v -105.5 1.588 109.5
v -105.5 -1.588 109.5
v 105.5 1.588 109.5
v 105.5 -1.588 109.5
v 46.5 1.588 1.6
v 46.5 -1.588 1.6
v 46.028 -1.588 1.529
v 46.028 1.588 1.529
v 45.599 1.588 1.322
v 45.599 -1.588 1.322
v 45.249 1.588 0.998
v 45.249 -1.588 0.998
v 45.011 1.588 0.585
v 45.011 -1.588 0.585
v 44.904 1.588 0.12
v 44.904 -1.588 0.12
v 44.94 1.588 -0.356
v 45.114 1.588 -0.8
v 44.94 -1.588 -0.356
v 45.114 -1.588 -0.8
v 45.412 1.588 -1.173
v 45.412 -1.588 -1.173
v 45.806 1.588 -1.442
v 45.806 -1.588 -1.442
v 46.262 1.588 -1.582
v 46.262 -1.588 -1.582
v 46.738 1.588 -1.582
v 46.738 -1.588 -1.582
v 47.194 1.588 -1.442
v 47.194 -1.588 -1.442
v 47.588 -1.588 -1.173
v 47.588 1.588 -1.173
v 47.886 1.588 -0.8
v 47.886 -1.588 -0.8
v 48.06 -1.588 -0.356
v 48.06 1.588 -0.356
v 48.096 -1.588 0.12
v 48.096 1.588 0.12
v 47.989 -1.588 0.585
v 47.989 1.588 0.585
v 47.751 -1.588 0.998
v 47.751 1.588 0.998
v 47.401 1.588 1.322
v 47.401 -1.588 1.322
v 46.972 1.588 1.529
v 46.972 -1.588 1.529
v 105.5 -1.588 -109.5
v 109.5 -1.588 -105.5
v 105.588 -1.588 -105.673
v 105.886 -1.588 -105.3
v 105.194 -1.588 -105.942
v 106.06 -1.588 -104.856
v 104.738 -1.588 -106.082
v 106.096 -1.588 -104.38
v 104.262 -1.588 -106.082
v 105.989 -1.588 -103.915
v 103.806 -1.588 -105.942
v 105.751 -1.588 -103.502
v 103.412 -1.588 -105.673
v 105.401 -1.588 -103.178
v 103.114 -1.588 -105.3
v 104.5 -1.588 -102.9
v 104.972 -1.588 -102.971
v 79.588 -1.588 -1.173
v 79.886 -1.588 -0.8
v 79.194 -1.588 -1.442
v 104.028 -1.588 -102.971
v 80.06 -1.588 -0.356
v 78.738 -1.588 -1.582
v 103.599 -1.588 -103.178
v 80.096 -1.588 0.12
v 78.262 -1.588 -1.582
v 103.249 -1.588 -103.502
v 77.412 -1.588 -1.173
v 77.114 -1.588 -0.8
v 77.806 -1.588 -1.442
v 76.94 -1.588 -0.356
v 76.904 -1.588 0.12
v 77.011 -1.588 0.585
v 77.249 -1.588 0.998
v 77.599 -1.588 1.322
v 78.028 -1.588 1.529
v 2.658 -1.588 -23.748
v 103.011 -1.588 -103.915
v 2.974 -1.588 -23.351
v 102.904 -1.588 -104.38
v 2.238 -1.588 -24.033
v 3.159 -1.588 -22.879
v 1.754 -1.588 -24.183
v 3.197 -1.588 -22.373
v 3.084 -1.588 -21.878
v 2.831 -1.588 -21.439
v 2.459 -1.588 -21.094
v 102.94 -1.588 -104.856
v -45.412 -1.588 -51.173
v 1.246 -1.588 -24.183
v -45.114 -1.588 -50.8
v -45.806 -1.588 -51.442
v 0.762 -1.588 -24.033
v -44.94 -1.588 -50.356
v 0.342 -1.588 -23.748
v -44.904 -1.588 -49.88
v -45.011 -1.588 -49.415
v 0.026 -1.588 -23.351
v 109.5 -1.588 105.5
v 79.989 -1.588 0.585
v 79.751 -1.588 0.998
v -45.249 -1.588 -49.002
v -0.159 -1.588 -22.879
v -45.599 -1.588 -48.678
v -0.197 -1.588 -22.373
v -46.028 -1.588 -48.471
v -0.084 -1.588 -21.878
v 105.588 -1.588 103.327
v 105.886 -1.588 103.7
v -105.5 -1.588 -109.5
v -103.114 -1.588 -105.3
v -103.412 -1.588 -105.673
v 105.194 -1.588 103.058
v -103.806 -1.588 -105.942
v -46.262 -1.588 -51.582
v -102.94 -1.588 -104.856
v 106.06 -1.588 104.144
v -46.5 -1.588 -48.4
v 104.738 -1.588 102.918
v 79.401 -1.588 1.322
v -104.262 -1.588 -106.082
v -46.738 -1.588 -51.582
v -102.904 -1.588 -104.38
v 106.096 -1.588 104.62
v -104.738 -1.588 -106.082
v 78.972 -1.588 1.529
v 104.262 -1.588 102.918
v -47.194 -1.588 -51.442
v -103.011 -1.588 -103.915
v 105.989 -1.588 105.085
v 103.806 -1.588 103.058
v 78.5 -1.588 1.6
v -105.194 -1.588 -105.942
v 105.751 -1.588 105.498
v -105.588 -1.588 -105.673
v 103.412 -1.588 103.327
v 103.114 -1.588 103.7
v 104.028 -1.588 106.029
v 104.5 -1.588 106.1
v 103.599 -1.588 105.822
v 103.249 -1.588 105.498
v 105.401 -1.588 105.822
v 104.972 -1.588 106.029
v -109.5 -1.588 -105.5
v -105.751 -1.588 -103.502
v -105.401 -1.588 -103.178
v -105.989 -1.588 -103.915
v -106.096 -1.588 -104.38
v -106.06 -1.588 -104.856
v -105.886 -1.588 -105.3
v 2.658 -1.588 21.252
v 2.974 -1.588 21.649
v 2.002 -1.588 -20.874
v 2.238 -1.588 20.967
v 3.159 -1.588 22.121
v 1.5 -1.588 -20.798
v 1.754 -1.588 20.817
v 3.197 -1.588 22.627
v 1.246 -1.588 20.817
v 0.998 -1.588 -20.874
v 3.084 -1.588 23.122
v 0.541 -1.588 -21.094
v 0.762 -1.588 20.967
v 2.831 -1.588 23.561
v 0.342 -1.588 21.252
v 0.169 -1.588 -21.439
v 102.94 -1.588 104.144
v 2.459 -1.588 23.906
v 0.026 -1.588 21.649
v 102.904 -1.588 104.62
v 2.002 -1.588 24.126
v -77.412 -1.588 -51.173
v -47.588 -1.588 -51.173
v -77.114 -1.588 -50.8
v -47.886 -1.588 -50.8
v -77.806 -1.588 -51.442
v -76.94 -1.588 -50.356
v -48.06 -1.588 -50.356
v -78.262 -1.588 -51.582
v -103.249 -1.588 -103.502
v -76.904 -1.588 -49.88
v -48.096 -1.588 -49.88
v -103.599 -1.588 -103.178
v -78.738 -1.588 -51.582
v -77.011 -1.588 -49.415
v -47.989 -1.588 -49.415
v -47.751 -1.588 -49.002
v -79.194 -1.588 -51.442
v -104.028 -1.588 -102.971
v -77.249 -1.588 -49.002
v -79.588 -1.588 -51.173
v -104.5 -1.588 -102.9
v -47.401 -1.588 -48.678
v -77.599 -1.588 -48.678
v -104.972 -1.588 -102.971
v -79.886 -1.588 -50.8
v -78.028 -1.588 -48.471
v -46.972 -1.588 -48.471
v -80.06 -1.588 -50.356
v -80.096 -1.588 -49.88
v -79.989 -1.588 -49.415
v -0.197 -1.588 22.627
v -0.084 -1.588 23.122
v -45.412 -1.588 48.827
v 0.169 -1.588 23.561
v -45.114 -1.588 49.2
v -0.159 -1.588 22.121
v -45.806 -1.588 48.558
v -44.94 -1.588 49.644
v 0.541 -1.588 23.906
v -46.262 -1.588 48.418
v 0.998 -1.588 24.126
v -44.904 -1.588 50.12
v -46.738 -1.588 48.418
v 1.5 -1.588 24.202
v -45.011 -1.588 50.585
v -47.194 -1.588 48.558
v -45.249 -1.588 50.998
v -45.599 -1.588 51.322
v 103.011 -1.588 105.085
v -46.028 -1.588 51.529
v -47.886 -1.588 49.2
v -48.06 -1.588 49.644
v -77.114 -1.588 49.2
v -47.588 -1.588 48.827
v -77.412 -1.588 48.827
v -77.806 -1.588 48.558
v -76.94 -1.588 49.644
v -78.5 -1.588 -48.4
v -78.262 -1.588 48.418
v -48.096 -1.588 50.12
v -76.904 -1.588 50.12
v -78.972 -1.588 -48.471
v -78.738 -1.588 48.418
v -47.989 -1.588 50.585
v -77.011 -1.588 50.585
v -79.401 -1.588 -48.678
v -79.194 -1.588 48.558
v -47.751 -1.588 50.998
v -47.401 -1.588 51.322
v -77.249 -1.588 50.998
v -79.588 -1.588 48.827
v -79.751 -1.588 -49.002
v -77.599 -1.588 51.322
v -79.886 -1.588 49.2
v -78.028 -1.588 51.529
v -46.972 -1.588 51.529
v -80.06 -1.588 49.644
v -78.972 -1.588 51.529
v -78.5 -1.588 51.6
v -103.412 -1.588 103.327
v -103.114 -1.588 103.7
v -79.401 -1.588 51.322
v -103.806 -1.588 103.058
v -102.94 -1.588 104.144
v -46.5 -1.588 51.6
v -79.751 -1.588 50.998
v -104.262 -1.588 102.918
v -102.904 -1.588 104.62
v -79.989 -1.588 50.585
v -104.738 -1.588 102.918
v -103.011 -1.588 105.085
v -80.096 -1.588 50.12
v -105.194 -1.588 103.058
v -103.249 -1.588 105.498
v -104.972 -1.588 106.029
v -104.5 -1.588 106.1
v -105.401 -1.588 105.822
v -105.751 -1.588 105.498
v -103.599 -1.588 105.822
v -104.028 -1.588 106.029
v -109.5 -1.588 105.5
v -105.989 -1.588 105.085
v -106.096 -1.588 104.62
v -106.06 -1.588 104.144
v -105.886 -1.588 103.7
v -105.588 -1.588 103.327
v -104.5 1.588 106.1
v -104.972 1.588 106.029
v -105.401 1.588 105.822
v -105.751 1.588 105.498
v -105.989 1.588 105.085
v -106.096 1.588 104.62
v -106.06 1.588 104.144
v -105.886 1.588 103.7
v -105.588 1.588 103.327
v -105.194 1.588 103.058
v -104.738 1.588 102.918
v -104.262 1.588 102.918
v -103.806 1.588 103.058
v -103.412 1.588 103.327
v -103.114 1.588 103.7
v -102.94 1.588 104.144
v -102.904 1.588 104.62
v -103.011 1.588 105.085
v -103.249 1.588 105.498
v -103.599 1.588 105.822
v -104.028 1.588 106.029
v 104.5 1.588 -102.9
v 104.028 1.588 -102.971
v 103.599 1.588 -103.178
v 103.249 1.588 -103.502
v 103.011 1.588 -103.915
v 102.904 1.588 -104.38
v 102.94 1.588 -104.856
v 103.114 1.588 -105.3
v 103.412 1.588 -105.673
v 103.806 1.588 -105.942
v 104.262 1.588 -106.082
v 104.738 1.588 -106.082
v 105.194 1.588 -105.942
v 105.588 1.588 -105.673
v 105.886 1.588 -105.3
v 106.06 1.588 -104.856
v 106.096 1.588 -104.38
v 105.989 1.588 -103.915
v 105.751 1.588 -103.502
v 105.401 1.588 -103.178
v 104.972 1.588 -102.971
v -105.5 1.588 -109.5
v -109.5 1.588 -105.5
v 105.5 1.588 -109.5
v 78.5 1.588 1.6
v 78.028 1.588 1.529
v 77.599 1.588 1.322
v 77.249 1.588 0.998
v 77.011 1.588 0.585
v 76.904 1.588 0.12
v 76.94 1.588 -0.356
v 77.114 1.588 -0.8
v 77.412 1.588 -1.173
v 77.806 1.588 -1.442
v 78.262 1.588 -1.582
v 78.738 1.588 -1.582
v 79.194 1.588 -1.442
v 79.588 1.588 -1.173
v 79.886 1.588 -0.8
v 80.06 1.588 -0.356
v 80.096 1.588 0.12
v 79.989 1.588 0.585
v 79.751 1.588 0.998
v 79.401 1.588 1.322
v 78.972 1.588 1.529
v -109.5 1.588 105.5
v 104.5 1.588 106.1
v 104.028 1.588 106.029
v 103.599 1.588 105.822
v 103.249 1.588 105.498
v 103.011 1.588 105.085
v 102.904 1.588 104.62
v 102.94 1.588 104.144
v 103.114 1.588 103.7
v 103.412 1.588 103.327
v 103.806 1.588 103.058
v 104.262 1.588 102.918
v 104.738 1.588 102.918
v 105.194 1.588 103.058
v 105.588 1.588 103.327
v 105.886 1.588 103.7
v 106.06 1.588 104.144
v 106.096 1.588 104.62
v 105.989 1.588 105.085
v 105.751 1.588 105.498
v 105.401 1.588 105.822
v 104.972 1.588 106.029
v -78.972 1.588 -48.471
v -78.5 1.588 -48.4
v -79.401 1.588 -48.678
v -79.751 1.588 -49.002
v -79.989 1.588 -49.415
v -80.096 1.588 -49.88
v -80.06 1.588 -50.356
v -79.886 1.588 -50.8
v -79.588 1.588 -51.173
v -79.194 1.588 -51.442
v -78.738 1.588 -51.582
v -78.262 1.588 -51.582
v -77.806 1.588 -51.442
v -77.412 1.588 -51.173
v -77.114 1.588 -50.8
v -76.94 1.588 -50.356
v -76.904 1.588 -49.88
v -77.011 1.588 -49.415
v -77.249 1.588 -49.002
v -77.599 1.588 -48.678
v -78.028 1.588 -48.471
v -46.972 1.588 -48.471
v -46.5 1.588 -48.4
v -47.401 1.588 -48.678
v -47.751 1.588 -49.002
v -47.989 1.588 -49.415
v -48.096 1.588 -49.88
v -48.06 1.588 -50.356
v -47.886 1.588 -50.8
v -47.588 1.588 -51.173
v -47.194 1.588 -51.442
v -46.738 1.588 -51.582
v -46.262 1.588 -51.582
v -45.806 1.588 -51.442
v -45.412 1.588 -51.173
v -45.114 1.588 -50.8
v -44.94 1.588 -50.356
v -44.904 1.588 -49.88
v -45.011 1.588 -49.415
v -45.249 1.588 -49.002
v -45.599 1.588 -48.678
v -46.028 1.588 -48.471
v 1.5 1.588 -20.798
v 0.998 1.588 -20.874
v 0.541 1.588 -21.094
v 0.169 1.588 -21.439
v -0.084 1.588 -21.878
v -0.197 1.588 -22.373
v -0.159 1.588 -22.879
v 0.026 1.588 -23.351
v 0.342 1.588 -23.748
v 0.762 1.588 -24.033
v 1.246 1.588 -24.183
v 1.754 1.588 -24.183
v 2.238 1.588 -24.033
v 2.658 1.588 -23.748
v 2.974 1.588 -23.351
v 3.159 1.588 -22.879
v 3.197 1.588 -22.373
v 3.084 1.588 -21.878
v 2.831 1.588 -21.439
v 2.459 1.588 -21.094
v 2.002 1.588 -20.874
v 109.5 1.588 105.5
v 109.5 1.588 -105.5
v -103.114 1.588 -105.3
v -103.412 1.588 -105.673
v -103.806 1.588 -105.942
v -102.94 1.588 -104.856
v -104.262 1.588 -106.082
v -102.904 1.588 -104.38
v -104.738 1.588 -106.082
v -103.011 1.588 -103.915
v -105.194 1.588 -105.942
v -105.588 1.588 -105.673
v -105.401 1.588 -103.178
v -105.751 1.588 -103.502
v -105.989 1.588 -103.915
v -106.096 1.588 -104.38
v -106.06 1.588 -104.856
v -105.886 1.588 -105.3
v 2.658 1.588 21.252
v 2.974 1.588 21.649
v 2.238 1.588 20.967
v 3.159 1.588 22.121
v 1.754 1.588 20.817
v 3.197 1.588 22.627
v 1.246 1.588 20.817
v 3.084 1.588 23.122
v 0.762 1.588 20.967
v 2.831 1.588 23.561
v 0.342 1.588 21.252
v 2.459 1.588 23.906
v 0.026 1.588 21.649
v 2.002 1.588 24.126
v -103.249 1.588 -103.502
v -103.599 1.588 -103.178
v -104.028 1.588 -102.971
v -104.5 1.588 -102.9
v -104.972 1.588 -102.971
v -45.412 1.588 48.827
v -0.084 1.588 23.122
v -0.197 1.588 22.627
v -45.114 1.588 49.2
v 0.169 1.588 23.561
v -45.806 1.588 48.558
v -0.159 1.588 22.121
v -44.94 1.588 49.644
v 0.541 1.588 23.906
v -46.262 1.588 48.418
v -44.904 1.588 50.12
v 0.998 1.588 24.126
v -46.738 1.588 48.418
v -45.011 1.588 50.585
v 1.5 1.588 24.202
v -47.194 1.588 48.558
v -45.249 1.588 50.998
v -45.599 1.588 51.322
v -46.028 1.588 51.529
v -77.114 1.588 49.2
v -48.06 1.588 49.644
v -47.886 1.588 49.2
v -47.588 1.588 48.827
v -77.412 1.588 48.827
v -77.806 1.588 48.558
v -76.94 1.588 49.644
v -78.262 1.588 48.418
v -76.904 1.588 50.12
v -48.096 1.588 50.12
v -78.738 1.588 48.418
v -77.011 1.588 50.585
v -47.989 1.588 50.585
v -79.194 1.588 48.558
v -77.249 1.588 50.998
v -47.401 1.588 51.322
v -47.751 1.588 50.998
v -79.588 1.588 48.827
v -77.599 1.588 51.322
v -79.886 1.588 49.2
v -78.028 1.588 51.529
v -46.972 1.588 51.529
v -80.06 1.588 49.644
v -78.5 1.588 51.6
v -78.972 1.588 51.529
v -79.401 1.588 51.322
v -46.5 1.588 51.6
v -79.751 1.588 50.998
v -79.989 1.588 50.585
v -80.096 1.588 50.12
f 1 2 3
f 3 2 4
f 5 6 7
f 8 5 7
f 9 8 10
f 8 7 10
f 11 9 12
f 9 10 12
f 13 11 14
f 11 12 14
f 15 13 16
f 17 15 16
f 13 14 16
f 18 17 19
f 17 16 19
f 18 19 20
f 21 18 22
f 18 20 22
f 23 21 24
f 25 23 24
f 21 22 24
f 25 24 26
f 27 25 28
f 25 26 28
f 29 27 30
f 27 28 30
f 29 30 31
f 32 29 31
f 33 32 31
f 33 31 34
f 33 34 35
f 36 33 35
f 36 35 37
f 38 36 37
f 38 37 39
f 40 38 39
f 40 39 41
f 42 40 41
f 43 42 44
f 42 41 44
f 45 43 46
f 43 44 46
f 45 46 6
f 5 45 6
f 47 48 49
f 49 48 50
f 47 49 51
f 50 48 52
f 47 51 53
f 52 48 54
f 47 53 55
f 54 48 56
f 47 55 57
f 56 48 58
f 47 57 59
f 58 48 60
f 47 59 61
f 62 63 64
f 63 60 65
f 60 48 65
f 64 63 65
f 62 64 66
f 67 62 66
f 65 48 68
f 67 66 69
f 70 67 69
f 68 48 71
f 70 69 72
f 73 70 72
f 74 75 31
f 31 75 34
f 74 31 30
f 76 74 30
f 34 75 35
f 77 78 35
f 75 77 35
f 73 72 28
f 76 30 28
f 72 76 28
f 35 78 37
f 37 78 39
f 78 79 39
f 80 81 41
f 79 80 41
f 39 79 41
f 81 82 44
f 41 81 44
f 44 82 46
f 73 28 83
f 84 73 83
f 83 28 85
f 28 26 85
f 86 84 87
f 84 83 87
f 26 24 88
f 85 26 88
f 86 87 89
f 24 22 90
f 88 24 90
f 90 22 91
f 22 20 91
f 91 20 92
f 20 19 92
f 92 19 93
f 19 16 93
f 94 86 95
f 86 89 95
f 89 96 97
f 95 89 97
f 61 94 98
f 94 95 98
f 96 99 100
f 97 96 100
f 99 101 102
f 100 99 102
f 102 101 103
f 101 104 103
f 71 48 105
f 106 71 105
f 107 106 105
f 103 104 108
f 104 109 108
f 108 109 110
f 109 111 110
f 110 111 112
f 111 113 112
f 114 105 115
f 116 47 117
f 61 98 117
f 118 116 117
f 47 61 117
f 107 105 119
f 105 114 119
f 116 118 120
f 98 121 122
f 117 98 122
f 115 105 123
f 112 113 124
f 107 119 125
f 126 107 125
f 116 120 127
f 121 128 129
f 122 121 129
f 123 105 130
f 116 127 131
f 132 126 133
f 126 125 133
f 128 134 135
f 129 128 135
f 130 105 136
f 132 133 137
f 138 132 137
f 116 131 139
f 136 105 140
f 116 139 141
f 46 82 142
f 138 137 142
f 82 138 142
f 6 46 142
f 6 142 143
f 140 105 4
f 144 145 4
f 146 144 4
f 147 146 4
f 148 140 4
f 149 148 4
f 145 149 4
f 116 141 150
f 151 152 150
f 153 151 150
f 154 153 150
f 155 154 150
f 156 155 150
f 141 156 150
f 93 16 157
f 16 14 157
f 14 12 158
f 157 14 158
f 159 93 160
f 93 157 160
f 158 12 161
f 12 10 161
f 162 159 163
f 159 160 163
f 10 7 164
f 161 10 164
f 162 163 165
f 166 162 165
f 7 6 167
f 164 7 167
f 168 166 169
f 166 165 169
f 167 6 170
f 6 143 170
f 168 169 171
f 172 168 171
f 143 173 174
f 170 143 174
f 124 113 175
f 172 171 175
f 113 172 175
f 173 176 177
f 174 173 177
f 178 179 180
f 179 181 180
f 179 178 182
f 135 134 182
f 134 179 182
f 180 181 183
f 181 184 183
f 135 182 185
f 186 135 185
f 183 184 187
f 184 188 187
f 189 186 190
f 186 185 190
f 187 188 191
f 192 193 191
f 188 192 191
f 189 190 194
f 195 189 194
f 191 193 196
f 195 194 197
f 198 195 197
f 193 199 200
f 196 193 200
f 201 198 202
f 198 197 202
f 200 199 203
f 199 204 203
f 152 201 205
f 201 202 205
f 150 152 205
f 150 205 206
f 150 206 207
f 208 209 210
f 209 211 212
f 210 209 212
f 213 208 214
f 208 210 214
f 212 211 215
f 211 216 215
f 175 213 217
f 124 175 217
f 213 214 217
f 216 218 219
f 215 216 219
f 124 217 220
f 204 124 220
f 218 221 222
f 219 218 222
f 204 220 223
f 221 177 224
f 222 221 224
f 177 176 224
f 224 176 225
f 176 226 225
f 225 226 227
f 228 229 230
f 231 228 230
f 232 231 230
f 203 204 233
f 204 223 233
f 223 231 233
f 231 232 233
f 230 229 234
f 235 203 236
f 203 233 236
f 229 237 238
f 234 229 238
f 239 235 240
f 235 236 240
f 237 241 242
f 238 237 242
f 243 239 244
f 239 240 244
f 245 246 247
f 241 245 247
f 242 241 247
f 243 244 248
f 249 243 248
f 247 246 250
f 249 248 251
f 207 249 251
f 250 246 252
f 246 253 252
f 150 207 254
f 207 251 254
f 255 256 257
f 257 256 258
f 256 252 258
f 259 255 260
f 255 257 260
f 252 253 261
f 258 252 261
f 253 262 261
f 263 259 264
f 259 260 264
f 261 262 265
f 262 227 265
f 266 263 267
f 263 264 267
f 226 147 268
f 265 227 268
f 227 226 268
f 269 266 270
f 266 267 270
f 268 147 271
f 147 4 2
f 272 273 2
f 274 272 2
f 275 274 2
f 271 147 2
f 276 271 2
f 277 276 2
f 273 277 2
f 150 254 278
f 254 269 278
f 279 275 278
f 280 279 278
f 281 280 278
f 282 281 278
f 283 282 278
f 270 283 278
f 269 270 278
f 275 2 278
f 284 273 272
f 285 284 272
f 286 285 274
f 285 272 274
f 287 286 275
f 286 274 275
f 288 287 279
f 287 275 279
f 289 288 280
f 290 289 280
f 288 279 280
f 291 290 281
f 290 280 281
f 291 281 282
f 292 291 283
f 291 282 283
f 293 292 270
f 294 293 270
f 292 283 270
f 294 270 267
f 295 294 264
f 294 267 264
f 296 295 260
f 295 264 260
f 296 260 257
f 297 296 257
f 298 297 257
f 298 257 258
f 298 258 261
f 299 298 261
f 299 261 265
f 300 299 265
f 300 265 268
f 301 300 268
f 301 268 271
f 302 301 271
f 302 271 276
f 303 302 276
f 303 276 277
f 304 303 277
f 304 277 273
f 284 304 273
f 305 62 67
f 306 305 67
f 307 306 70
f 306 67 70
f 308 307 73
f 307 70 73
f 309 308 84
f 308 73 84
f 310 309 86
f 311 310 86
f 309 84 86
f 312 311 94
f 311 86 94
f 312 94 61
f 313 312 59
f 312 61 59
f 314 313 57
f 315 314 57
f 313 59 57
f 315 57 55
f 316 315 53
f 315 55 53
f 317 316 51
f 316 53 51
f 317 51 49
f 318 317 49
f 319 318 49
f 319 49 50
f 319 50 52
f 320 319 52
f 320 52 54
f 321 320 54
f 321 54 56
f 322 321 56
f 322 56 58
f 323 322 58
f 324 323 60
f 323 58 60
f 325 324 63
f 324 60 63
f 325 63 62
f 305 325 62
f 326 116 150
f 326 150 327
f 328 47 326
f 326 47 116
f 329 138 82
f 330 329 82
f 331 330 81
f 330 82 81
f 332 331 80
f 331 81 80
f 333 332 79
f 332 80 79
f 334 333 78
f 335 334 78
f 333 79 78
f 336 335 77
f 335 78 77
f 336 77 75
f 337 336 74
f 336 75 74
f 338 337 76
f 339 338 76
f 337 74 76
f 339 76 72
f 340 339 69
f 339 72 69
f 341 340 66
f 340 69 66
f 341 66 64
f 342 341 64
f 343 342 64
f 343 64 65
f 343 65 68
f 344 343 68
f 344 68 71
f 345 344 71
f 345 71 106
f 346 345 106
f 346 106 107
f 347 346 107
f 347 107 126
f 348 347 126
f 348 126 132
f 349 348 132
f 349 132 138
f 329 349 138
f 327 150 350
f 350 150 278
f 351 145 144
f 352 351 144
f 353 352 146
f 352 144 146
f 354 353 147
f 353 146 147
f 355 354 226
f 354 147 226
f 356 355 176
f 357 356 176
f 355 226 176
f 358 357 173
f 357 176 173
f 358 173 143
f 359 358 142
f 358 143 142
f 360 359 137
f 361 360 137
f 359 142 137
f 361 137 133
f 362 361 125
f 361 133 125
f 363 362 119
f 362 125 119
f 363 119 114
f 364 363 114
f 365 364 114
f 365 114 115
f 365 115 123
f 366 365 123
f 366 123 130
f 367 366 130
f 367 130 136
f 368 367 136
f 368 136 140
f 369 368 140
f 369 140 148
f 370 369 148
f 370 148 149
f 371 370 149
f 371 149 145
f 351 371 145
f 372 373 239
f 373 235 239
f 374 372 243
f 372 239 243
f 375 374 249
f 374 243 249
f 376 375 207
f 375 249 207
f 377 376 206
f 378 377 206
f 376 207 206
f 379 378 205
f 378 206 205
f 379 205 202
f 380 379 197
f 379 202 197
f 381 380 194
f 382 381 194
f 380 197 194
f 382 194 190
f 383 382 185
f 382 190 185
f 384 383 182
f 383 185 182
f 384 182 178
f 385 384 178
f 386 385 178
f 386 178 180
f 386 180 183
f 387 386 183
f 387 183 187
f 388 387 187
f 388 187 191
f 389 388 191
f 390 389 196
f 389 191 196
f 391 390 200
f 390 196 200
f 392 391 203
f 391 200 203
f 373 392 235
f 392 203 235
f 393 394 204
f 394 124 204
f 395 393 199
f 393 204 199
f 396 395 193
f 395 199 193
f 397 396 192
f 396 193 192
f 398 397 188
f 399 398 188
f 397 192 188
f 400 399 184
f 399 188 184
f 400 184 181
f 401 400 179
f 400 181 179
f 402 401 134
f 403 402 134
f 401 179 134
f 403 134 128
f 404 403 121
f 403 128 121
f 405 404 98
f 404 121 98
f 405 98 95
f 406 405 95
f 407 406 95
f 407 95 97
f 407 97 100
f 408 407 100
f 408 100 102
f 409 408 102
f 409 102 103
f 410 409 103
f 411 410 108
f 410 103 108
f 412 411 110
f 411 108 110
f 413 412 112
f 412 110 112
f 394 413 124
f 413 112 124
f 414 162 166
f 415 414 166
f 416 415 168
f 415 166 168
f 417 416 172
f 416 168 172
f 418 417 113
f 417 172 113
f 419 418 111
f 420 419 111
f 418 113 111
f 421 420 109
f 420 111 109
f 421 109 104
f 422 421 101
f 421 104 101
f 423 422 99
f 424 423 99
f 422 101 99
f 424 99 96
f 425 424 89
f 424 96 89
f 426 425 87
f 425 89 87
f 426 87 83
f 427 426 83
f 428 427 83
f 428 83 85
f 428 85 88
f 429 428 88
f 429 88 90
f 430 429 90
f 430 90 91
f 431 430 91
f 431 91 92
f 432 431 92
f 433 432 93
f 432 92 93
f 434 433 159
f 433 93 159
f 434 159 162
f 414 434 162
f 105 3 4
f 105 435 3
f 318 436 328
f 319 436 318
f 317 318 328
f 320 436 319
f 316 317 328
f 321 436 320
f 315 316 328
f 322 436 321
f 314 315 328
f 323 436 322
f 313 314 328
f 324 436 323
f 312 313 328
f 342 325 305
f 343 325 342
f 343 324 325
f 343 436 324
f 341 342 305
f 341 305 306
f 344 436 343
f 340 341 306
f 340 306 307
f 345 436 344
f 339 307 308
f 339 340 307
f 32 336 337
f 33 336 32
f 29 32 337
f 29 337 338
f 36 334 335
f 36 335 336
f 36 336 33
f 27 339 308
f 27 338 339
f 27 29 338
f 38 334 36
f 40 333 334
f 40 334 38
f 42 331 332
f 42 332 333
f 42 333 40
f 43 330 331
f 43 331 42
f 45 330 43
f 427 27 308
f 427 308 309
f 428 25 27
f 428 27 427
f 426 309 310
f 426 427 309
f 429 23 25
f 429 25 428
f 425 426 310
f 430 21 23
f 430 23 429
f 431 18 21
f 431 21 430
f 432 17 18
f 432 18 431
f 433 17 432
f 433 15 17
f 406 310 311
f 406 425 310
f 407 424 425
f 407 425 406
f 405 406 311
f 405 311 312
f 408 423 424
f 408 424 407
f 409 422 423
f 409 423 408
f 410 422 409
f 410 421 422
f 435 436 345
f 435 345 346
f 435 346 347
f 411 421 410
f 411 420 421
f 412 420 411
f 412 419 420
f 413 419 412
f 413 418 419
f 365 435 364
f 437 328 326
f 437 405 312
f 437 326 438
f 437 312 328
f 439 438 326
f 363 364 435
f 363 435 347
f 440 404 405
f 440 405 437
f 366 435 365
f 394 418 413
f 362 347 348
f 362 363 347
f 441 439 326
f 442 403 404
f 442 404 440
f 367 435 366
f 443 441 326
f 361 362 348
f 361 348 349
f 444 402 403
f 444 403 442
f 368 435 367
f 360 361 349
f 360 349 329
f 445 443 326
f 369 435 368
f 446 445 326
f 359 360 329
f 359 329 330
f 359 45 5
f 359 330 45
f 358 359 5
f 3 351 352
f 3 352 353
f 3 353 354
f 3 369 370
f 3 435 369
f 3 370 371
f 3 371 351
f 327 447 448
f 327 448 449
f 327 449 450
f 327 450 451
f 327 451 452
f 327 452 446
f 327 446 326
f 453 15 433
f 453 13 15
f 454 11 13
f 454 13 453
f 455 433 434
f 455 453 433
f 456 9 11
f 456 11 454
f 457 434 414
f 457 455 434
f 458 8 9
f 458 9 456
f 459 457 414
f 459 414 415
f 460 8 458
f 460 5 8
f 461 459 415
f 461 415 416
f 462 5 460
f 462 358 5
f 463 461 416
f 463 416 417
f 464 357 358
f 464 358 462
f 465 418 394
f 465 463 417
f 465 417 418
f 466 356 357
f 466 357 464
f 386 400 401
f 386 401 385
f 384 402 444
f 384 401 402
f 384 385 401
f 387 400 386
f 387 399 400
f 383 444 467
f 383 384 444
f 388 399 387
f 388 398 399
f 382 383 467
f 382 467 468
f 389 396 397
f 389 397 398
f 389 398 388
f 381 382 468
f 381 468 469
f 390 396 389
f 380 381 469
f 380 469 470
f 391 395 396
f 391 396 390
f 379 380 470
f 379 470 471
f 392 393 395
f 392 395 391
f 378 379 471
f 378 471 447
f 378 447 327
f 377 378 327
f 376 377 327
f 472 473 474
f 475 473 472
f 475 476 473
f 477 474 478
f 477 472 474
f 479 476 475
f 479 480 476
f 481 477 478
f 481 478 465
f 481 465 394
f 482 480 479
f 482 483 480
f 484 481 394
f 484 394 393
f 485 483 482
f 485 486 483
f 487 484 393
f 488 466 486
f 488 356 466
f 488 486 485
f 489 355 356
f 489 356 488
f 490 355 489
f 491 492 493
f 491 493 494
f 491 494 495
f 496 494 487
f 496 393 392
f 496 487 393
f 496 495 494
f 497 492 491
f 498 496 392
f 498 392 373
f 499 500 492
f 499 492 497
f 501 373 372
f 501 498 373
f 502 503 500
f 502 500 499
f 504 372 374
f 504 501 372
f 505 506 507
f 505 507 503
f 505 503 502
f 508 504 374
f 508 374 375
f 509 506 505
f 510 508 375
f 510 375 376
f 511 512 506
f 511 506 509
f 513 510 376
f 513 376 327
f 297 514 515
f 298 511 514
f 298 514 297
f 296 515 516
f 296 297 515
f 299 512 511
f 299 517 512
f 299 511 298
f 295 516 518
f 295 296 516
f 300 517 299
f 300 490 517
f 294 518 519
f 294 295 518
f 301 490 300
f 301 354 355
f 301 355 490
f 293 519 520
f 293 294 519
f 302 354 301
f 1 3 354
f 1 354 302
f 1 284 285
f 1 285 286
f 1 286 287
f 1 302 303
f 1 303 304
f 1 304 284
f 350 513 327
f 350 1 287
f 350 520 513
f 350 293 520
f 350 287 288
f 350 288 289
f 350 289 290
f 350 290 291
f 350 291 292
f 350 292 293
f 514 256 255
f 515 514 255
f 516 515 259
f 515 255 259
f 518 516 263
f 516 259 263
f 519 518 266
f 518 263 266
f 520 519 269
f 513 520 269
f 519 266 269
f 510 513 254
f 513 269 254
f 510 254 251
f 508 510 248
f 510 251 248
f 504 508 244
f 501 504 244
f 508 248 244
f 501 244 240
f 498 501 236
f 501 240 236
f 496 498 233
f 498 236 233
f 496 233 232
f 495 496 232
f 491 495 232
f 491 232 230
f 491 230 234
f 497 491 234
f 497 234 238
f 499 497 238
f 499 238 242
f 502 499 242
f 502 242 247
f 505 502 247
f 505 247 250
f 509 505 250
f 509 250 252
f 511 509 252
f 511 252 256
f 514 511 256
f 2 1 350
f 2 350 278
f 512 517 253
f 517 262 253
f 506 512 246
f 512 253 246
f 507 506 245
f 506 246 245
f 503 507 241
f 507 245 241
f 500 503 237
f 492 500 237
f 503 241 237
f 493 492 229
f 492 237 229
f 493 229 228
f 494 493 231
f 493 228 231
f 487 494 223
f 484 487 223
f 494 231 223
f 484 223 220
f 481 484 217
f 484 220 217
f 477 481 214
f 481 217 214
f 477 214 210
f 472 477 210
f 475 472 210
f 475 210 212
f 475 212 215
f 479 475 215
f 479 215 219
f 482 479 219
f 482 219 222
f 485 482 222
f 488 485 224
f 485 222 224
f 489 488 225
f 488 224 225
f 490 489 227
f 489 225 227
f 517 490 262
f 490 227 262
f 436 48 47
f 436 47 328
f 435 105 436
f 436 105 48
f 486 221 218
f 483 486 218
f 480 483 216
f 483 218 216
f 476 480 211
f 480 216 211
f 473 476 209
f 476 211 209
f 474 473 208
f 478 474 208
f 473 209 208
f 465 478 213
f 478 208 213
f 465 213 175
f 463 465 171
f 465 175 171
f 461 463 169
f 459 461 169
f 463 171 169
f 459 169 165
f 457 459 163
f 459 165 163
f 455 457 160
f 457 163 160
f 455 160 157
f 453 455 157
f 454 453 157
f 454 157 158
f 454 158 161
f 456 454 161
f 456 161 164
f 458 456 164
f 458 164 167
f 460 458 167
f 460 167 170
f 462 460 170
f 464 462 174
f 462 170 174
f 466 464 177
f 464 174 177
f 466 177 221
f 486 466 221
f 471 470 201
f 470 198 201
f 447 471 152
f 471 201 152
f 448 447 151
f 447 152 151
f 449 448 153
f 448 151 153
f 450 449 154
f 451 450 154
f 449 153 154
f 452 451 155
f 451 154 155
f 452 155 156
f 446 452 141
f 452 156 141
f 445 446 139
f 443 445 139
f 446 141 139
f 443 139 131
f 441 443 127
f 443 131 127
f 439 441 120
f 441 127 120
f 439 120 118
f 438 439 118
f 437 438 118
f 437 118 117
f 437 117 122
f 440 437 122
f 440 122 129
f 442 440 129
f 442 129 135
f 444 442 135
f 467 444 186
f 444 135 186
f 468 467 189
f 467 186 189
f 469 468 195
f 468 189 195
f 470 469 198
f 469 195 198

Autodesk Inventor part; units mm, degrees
ref_plane "YZ Plane" through (0, 0, 0) normal (1, 0, 0) x (0, 1, 0)
ref_plane "XZ Plane" through (0, 0, 0) normal (0, 1, 0) x (-1, 0, 0)
ref_plane "XY Plane" through (0, 0, 0) normal (0, 0, 1) x (1, 0, 0)
sketch "Sketch1" plane through (0, 0, 0) normal (0, 1, 0) x (-1, 0, 0)
  line L0 (109.5, 109.5) -> (-109.5, 109.5)
  line L1 (-109.5, 109.5) -> (-109.5, -109.5)
  line L2 (-109.5, -109.5) -> (109.5, -109.5)
  line L3 (109.5, -109.5) -> (109.5, 109.5)
  line L4 (109.5, 109.5) -> (-109.5, -109.5) construction
  line L5 (-109.5, 109.5) -> (109.5, -109.5) construction
  point P0 (0, 0)
  dimension "d0" = 219
extrude "Extrusion1" add sketch "Sketch1" along normal mid plane 3.175
chamfer "Chamfer1" distance 4 angle 45 4 edges at (-109.5, 0, 109.5) (-109.5, 0, -109.5) (109.5, 0, -109.5) (109.5, 0, 109.5)
sketch "Sketch3" plane through (0, 1.5875, 0) normal (0, 1, 0) x (1, 0, 0)
  line L0 (-104.5, -104.5) -> (104.5, -104.5) construction
  line L1 (104.5, -104.5) -> (104.5, 104.5) construction
  line L2 (104.5, 104.5) -> (-104.5, 104.5) construction
  line L3 (-104.5, 104.5) -> (-104.5, -104.5) construction
  line L4 (-104.5, -104.5) -> (104.5, 104.5) construction
  line L5 (104.5, -104.5) -> (-104.5, 104.5) construction
  line L6 (-78.5, 50) -> (-46.5, 50) construction
  line L7 (-78.5, -50) -> (-46.5, -50) construction
  line L8 (46.5, 0) -> (78.5, 0) construction
  point P0 (0, 0)
  point P1 (0, 0)
  dimension "d16" = 209
  dimension "d17" = 209
  dimension "d18" = 32
  dimension "d20" = 46.5
  dimension "d21" = 46.5
  dimension "d22" = 100
  dimension "d23" = 50
  dimension "d24" = 93
hole "Hole1" at (-104.5, 1.5875, -104.5) at (104.5, 1.5875, -104.5) at (104.5, 1.5875, 104.5) at (-104.5, 1.5875, 104.5) at (-78.5, 1.5875, -50) at (-46.5, 1.5875, -50) at (46.5, 1.5875, 0) at (78.5, 1.5875, 0) at (-46.5, 1.5875, 50) at (-78.5, 1.5875, 50) direction (0, -1, 0) diameter 3.2 end through all
sketch "Sketch4" plane through (0, 1.5875, 0) normal (0, 1, 0) x (1, 0, 0)
  line L0 (1.5, 22.5) -> (1.5, -22.5)
  line L1 (-109.5, 105.5) -> (-109.5, -105.5) projected
  point P0 (0, 0)
  point P1 (-114.5, 42.3569)
  point P2 (1.5, 0)
  point P3 (-109.5, -105.5)
  dimension "d38" = 45
  dimension "d39" = 111
hole "Hole2" at (1.5, 1.5875, -22.5) at (1.5, 1.5875, 22.5) direction (0, -1, 0) diameter 3.4036 depth 6.4 clearance for "Flat Head Machine Screw" size "M3" standard "Ansi Metric M Profile"
equation "\"d21\" = d20"
properties part number "Heated Bed Plate" material "Aluminum 6061"
